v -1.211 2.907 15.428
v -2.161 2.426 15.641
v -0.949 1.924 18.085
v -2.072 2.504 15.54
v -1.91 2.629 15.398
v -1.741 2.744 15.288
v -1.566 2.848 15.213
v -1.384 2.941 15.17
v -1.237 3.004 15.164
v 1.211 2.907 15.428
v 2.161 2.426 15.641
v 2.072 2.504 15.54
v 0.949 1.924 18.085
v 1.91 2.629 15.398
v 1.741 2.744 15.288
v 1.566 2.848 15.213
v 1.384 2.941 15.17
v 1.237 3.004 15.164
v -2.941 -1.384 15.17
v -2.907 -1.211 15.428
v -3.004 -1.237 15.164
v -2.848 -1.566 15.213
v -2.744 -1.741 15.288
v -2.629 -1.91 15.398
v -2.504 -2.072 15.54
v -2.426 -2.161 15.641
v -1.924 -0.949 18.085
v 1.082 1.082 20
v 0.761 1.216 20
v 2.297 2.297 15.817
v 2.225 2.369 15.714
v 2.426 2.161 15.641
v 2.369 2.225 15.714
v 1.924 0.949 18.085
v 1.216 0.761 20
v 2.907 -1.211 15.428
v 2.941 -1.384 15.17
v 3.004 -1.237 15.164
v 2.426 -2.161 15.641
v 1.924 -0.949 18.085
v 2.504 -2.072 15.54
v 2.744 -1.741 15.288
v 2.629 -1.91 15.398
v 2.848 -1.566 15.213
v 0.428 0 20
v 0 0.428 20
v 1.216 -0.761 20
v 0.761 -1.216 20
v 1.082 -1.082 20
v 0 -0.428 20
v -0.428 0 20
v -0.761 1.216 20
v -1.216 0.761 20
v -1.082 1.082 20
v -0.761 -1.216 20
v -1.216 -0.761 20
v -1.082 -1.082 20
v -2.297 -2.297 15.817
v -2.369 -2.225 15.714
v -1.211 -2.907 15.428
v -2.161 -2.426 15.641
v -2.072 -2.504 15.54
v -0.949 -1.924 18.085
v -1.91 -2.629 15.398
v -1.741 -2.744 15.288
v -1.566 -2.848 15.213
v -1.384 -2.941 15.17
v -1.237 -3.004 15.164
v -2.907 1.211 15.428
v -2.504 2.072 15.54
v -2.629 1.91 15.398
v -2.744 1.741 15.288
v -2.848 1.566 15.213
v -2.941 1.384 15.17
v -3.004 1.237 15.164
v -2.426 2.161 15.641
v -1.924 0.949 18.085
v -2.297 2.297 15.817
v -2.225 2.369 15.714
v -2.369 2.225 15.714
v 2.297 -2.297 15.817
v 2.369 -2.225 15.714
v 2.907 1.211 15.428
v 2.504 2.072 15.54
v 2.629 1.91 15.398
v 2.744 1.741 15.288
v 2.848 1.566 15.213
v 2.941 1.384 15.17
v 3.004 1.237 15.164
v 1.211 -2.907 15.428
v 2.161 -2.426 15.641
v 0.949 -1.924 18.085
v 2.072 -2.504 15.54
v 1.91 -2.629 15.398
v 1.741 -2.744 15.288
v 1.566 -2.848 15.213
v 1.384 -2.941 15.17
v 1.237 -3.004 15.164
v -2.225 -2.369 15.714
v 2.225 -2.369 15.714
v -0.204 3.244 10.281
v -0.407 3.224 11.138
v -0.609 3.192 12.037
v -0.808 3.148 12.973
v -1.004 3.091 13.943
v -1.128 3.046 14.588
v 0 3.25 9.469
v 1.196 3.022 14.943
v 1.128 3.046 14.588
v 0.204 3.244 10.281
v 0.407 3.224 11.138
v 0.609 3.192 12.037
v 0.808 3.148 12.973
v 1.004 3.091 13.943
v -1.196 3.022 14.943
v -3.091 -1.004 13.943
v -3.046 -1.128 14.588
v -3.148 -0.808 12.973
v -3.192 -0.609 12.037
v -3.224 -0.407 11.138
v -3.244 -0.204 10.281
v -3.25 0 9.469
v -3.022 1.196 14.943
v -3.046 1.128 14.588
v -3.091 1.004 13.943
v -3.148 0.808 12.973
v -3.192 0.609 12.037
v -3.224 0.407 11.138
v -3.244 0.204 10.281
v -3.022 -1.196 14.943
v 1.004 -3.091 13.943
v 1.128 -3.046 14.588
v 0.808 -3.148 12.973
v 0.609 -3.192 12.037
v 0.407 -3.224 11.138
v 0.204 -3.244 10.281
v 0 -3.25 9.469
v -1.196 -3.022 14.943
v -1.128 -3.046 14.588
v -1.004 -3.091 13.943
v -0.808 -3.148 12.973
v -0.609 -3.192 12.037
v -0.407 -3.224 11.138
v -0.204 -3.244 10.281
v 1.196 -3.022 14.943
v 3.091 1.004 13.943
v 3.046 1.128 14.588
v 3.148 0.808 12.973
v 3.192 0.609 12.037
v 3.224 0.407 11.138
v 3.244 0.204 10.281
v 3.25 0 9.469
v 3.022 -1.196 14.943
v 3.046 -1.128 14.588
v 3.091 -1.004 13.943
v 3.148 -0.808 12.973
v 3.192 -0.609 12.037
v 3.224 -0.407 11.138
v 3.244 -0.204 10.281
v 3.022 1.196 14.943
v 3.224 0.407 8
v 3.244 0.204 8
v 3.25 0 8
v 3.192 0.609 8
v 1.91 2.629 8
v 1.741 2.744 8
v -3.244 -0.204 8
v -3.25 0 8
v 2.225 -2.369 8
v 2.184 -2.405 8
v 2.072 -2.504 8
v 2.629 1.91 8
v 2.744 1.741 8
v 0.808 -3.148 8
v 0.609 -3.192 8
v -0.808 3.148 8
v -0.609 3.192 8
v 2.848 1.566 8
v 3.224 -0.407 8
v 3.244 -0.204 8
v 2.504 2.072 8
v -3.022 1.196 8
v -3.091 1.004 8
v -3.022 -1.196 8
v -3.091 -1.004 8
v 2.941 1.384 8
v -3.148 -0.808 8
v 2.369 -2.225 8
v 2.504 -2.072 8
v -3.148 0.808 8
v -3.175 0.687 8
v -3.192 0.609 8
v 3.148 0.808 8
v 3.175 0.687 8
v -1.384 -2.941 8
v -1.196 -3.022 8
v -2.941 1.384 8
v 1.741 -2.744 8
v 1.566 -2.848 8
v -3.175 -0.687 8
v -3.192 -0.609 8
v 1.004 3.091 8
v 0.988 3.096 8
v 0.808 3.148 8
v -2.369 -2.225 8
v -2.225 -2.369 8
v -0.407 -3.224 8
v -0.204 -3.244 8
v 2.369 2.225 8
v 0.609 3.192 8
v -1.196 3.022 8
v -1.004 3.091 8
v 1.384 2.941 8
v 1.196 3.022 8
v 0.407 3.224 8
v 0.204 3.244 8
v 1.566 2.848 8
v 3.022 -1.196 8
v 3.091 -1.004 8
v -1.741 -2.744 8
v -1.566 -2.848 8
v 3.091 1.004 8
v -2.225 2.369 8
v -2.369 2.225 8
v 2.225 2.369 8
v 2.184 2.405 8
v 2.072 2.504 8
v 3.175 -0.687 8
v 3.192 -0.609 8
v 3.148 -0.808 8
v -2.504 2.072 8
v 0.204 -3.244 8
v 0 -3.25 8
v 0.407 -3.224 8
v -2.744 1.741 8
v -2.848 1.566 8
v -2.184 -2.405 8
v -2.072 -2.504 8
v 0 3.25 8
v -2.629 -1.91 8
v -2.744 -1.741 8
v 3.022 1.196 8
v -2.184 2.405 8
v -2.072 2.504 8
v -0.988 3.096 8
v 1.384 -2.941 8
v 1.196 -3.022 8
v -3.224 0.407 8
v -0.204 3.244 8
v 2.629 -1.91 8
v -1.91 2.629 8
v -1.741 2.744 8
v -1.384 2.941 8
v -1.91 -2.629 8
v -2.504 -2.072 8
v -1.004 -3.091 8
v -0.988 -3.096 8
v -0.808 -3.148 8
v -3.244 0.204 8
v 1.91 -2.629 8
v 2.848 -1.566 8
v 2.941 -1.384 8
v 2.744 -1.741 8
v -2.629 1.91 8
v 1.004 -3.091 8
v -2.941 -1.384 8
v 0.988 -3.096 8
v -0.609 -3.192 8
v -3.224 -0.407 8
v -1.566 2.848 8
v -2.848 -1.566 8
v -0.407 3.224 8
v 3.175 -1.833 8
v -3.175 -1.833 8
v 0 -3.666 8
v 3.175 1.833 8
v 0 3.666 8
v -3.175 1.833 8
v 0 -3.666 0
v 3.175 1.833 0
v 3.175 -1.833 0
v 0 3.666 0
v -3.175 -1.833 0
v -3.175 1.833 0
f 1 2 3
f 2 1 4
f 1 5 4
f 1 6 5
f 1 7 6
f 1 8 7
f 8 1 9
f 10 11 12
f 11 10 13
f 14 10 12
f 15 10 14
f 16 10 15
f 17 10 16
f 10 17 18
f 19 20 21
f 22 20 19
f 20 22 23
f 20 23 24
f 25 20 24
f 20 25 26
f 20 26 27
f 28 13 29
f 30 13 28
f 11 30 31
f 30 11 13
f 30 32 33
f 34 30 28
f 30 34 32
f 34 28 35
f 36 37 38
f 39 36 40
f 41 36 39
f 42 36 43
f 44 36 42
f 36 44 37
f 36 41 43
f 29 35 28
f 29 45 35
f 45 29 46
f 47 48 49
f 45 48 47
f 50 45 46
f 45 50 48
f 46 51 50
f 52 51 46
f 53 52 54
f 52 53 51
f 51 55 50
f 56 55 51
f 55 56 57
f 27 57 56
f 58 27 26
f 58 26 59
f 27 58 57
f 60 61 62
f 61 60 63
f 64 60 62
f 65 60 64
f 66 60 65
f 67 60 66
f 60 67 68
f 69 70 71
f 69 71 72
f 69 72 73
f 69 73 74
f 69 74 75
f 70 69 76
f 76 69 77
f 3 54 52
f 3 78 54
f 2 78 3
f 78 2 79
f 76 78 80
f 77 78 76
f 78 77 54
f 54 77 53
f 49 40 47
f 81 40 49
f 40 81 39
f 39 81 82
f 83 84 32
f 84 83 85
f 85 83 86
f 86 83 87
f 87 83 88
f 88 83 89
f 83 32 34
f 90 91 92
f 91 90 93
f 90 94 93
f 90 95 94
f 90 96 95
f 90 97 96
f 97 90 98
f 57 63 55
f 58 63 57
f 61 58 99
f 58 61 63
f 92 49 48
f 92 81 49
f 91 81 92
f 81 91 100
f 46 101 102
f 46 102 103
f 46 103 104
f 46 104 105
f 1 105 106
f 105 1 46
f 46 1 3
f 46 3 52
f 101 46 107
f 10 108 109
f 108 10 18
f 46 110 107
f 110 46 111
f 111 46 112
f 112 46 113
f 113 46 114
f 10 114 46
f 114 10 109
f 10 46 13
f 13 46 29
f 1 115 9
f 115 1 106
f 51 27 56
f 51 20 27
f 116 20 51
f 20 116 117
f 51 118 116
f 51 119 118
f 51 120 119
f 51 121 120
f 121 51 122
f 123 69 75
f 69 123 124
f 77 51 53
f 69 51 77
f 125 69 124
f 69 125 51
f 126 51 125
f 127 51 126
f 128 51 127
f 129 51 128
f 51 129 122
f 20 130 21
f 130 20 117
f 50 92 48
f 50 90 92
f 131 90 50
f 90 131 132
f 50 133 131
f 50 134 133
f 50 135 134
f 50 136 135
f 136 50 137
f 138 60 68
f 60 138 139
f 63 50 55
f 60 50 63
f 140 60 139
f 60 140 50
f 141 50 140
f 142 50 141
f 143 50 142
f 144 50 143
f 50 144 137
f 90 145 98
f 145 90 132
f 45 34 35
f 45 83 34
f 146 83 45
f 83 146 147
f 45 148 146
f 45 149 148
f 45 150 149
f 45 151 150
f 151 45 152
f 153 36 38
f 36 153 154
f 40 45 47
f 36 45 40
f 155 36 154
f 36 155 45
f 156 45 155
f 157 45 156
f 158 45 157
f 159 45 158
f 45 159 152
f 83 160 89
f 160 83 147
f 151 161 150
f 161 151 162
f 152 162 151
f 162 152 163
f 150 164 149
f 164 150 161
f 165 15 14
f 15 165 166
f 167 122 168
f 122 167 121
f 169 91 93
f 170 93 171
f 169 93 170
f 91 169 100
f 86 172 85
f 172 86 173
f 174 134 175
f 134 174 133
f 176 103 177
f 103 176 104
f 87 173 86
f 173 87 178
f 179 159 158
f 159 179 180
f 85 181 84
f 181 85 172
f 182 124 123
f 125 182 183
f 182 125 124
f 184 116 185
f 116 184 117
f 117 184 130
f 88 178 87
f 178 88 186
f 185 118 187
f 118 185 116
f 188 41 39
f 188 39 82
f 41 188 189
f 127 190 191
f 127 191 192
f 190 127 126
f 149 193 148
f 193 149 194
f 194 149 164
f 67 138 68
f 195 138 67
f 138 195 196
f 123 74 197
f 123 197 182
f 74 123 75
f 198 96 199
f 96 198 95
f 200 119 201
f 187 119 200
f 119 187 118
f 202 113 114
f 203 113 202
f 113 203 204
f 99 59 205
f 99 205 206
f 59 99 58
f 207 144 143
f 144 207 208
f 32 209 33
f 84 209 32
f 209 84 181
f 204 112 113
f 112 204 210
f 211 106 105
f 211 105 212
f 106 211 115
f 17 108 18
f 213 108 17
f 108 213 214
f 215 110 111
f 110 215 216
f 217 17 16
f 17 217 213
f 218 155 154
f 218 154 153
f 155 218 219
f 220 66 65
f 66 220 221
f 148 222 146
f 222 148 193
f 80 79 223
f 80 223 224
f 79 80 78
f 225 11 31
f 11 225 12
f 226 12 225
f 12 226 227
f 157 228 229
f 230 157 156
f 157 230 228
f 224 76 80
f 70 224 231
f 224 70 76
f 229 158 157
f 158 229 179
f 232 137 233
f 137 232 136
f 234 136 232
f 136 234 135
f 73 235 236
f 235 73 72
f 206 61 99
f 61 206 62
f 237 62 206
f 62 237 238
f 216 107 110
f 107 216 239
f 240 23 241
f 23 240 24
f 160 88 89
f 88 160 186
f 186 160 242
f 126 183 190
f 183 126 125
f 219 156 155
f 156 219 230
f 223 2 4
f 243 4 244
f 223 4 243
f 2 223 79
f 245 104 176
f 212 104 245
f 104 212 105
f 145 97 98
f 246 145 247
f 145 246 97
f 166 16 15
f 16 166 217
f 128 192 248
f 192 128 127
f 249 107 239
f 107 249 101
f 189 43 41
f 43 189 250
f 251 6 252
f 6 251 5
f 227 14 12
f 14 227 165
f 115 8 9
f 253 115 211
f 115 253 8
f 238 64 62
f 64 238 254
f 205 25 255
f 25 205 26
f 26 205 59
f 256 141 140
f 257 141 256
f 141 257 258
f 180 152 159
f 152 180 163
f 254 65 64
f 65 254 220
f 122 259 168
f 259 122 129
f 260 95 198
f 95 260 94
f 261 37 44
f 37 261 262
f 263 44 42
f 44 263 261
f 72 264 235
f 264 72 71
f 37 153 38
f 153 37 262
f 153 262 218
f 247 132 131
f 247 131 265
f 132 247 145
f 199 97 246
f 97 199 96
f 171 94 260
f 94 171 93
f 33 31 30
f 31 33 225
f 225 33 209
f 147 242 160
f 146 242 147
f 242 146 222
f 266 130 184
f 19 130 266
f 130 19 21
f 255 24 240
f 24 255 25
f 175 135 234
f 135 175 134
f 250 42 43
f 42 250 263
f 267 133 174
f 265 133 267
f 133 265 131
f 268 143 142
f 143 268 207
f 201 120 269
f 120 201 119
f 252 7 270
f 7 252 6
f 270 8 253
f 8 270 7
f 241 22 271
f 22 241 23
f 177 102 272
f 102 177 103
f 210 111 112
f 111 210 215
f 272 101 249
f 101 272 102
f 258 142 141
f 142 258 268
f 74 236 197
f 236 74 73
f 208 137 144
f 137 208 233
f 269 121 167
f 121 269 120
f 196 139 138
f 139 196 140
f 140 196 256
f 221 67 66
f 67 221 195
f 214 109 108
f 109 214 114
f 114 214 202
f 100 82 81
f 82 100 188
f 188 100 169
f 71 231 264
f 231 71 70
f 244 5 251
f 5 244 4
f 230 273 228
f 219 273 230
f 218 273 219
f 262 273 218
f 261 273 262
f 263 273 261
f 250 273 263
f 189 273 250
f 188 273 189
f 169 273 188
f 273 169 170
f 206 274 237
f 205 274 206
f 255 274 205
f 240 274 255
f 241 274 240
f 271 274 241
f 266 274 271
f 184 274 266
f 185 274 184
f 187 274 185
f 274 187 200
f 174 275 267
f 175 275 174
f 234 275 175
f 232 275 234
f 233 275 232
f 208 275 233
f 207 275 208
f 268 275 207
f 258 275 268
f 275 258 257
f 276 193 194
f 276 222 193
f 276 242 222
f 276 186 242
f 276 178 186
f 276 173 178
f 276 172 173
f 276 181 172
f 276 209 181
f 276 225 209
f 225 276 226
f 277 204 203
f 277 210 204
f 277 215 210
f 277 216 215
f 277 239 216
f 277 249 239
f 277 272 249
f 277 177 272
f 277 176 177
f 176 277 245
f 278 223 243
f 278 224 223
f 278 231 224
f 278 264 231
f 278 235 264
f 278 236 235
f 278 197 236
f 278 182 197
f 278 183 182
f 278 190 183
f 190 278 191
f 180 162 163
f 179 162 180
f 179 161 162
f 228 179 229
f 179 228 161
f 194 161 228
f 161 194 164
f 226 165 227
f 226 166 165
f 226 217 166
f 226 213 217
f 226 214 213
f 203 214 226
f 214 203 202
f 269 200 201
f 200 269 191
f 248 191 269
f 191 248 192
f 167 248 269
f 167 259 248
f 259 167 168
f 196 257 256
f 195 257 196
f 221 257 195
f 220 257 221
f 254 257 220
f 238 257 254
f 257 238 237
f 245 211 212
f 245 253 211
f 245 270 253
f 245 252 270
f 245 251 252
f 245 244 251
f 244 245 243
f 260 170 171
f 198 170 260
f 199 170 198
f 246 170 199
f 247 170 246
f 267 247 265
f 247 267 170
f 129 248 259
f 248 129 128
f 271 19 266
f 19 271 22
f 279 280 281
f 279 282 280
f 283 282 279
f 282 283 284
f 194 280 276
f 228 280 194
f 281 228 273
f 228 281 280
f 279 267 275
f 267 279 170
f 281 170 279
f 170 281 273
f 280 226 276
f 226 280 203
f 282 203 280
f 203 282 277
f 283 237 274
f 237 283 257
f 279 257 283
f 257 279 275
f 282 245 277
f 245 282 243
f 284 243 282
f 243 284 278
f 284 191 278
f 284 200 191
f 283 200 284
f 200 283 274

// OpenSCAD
midPoint = 50 * sqrt(3);
module triangle()
{
    polygon(points = [
        [ 0, 0 ],
        [ midPoint, 50 ],
        [ 0, 100 ],
    ]);
}
module bitTop()
{

    translate([ 0, 4.25, 5.25 ]) rotate([ 15, 0, 0 ]) rotate([ 0, 0, 45 ]) cube([ 2.75, 2.75, 20 ], center = true);
}
union()
{
    linear_extrude(height = 8) resize([ 6.35, 7.3323, 0 ])
    {
        rotation = 60;
        translate([ -midPoint, -50, 0 ])
        {
            triangle();
            rotate([ 0, 0, rotation ])
            {
                translate([ 0, -100, 0 ])
                {
                    triangle();
                    rotate([ 0, 0, rotation ])
                    {
                        translate([ 0, -100, 0 ])
                        {
                            triangle();
                            rotate([ 0, 0, rotation ])
                            {
                                translate([ 0, -100, 0 ])
                                {
                                    triangle();
                                    rotate([ 0, 0, rotation ])
                                    {
                                        translate([ 0, -100, 0 ])
                                        {
                                            triangle();
                                        }
                                    }
                                    rotate([ 0, 0, rotation ])
                                    {
                                        translate([ 0, -100, 0 ])
                                        {
                                            triangle();
                                            rotate([ 0, 0, rotation ])
                                            {
                                                translate([ 0, -100, 0 ])
                                                {
                                                    triangle();
                                                }
                                            }
                                        }
                                    }
                                }
                            }
                        }
                    }
                }
            }
        }
    }

    translate([ 0, 0, 8 ])
    {
        difference()
        {
            cylinder(h = 13, r = 3.25, $fn = 100);
            translate([ 0, 0, 3 ])
            {

                difference()
                {
                    translate([ 0, 0, 4. ]) cylinder(h = 6, r = 4, $fn = 100);
                    resize([ 0, 0, 18 ]) sphere(r = 4, $fn = 8);
                }
            }
            for (i = [0:90:270])
            {

                rotate(i) bitTop();
            }
        }
    }
}
